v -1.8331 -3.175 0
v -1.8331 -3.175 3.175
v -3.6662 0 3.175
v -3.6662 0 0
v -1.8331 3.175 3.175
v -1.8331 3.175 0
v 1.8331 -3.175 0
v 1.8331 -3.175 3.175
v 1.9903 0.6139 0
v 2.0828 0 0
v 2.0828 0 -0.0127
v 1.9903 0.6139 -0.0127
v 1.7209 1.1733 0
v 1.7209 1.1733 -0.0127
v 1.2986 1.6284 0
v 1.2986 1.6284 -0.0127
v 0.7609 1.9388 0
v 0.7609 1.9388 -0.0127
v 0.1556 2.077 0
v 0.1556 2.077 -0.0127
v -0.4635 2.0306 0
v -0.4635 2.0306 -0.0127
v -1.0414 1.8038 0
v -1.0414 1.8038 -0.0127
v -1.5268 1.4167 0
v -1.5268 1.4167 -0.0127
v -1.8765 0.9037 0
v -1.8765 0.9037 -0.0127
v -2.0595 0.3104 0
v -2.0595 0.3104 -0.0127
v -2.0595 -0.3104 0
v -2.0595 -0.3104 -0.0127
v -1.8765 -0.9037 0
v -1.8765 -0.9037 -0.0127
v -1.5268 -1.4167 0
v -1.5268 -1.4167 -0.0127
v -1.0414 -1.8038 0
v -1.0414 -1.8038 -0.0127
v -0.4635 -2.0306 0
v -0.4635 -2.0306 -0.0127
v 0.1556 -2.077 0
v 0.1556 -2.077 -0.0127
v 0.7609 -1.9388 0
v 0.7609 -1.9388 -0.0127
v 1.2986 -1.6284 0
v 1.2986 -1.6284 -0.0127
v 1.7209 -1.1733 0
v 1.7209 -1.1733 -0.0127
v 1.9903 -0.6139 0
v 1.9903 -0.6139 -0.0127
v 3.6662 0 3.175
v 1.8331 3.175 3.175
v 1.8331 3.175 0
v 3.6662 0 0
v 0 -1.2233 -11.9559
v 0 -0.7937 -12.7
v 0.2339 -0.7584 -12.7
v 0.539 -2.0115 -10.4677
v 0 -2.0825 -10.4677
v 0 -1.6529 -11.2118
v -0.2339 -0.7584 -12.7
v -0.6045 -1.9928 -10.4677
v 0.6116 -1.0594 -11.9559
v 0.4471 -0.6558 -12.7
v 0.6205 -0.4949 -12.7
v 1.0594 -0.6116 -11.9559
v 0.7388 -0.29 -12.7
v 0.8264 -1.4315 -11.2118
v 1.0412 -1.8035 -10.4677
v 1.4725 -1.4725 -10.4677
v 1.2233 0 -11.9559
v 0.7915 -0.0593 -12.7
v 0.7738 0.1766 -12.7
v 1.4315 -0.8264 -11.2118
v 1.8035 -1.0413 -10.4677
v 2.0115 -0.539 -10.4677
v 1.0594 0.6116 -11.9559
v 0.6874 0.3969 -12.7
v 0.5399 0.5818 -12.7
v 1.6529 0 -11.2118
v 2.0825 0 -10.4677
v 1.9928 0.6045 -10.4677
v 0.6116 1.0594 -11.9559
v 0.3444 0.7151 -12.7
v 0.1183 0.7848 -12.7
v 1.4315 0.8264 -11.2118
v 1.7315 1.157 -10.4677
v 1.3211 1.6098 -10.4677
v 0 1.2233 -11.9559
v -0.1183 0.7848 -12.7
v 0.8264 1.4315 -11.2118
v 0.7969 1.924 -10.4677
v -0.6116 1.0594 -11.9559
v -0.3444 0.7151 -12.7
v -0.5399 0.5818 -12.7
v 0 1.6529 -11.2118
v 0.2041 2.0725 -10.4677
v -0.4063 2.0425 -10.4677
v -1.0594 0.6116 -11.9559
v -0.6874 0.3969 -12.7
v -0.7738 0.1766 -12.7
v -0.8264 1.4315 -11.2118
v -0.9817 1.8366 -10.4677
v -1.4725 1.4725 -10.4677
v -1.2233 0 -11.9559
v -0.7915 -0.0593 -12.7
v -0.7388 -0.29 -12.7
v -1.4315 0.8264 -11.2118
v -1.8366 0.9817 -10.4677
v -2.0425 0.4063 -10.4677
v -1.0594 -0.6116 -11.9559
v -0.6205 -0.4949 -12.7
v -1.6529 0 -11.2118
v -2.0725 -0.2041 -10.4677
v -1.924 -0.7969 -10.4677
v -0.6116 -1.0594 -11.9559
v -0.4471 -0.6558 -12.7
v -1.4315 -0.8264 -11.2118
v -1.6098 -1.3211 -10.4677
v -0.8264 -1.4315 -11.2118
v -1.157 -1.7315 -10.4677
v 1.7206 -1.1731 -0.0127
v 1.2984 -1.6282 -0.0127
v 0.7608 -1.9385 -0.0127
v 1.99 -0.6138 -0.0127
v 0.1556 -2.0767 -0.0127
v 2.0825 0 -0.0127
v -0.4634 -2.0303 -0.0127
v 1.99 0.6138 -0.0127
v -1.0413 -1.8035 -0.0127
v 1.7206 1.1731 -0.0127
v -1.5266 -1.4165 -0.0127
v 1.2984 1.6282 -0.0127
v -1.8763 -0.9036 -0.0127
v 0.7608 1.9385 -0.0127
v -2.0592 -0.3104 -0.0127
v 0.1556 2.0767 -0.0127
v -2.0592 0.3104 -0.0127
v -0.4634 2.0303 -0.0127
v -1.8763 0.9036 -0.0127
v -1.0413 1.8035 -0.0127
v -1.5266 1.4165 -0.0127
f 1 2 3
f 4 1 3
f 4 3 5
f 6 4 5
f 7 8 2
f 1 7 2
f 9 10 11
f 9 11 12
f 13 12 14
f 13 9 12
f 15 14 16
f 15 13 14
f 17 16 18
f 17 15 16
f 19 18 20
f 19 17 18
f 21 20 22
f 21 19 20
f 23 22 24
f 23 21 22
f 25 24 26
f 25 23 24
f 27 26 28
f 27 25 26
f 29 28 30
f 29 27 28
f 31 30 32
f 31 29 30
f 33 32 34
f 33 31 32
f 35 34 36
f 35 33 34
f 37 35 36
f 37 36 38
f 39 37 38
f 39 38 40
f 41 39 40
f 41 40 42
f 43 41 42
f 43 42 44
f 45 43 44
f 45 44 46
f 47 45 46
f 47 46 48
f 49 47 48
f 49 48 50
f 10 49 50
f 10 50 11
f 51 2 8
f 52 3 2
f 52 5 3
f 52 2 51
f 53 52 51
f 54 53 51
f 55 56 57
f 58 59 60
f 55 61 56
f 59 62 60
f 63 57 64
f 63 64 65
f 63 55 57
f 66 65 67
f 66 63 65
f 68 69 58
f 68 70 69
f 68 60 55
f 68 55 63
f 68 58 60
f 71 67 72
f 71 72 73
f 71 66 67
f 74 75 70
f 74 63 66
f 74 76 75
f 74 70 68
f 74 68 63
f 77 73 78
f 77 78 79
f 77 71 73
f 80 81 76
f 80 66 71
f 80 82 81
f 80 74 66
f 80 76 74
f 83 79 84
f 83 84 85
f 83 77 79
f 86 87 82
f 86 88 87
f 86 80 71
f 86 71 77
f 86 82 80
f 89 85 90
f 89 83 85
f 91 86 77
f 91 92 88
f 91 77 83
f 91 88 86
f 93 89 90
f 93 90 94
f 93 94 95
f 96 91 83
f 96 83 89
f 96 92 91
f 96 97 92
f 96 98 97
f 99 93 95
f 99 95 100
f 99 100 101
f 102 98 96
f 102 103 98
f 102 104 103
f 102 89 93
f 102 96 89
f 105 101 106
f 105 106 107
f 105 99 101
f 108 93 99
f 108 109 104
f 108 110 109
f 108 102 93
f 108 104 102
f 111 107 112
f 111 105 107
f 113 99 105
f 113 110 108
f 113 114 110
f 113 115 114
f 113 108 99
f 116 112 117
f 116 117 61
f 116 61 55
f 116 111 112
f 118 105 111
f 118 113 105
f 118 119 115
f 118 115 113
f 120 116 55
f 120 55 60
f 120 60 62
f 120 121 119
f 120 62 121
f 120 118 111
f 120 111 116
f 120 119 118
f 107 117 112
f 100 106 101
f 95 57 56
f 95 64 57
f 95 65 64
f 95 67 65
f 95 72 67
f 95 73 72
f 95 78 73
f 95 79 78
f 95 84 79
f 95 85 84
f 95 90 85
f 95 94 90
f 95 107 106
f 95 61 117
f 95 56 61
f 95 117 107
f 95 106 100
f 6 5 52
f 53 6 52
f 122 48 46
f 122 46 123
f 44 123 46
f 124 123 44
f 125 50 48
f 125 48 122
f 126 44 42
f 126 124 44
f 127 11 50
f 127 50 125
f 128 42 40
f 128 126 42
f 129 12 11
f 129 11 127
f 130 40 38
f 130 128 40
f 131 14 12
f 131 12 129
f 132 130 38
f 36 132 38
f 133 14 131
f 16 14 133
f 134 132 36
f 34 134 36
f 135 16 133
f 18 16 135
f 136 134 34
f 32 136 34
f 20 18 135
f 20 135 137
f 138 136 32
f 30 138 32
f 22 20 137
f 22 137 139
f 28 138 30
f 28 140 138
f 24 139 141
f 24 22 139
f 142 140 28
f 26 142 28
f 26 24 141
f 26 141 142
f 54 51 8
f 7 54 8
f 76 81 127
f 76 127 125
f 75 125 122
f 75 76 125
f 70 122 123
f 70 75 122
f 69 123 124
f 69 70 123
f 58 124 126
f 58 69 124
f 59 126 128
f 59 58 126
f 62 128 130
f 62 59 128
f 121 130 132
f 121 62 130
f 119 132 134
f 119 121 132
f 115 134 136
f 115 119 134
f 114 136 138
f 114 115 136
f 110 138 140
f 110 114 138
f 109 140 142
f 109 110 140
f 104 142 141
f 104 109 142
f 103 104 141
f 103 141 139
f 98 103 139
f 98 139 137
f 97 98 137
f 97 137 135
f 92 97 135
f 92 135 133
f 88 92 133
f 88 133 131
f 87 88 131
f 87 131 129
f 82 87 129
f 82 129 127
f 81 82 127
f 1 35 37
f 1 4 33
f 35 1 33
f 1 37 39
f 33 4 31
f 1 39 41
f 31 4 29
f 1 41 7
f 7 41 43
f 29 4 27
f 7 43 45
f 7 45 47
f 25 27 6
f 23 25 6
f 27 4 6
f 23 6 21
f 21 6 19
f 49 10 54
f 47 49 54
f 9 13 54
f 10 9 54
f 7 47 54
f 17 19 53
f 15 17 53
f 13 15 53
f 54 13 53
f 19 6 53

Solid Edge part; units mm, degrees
sketch "Sketch1" plane through (0, 0, 0) normal (0, 0, 1) x (1, 0, 0)
  circle A0 centre (0, 0) radius 6.4452
  dimension "D1" = 12.8905
extrude "Protrusion1" add sketch "Sketch1" along normal blind 3.175
sketch "Sketch2" plane through (0, 0, 0) normal (0, 0, -1) x (1, 0, 0)
  circle A0 centre (0, 0) radius 2.0828
extrude "Protrusion2" add sketch "Sketch2" along normal blind 12.7
sketch "Sketch3" plane through (0, 0, -12.7) normal (0, 0, -1) x (1, 0, 0)
  circle A0 centre (0, 0) radius 2.0825
extrude "Cutout1" cut sketch "Sketch3" against normal blind 12.6873 flip side to cut
sketch "Sketch4" plane through (0, 0, 3.175) normal (0, 0, 1) x (1, 0, 0)
  line L0 (-5.609, 3.175) -> (5.609, 3.175)
  dimension "D1" = 6.35
extrude "Cutout2" cut sketch "Sketch4" against normal up to next material side at (0, 3.225, 3.175)
sketch "Sketch5" plane through (0, 0, 0) normal (1, 0, 0) x (0, 1, 0)
  line L0 (-0.7937, -12.7) -> (-2.0825, -10.4677)
  dimension "D1" = 0.7937
revolve "RevolvedCutout1" cut sketch "Sketch5" angle 360 about axis through (0, 0, -14.7796) along (0, 0, 1) material side at (0, -1.4814, -11.6088)
pattern_circular "Pattern1" count 6 over 360 about axis through (0, 0, 3.175) along (0, 0, 1) of "Cutout2"
properties part number "24102273"
